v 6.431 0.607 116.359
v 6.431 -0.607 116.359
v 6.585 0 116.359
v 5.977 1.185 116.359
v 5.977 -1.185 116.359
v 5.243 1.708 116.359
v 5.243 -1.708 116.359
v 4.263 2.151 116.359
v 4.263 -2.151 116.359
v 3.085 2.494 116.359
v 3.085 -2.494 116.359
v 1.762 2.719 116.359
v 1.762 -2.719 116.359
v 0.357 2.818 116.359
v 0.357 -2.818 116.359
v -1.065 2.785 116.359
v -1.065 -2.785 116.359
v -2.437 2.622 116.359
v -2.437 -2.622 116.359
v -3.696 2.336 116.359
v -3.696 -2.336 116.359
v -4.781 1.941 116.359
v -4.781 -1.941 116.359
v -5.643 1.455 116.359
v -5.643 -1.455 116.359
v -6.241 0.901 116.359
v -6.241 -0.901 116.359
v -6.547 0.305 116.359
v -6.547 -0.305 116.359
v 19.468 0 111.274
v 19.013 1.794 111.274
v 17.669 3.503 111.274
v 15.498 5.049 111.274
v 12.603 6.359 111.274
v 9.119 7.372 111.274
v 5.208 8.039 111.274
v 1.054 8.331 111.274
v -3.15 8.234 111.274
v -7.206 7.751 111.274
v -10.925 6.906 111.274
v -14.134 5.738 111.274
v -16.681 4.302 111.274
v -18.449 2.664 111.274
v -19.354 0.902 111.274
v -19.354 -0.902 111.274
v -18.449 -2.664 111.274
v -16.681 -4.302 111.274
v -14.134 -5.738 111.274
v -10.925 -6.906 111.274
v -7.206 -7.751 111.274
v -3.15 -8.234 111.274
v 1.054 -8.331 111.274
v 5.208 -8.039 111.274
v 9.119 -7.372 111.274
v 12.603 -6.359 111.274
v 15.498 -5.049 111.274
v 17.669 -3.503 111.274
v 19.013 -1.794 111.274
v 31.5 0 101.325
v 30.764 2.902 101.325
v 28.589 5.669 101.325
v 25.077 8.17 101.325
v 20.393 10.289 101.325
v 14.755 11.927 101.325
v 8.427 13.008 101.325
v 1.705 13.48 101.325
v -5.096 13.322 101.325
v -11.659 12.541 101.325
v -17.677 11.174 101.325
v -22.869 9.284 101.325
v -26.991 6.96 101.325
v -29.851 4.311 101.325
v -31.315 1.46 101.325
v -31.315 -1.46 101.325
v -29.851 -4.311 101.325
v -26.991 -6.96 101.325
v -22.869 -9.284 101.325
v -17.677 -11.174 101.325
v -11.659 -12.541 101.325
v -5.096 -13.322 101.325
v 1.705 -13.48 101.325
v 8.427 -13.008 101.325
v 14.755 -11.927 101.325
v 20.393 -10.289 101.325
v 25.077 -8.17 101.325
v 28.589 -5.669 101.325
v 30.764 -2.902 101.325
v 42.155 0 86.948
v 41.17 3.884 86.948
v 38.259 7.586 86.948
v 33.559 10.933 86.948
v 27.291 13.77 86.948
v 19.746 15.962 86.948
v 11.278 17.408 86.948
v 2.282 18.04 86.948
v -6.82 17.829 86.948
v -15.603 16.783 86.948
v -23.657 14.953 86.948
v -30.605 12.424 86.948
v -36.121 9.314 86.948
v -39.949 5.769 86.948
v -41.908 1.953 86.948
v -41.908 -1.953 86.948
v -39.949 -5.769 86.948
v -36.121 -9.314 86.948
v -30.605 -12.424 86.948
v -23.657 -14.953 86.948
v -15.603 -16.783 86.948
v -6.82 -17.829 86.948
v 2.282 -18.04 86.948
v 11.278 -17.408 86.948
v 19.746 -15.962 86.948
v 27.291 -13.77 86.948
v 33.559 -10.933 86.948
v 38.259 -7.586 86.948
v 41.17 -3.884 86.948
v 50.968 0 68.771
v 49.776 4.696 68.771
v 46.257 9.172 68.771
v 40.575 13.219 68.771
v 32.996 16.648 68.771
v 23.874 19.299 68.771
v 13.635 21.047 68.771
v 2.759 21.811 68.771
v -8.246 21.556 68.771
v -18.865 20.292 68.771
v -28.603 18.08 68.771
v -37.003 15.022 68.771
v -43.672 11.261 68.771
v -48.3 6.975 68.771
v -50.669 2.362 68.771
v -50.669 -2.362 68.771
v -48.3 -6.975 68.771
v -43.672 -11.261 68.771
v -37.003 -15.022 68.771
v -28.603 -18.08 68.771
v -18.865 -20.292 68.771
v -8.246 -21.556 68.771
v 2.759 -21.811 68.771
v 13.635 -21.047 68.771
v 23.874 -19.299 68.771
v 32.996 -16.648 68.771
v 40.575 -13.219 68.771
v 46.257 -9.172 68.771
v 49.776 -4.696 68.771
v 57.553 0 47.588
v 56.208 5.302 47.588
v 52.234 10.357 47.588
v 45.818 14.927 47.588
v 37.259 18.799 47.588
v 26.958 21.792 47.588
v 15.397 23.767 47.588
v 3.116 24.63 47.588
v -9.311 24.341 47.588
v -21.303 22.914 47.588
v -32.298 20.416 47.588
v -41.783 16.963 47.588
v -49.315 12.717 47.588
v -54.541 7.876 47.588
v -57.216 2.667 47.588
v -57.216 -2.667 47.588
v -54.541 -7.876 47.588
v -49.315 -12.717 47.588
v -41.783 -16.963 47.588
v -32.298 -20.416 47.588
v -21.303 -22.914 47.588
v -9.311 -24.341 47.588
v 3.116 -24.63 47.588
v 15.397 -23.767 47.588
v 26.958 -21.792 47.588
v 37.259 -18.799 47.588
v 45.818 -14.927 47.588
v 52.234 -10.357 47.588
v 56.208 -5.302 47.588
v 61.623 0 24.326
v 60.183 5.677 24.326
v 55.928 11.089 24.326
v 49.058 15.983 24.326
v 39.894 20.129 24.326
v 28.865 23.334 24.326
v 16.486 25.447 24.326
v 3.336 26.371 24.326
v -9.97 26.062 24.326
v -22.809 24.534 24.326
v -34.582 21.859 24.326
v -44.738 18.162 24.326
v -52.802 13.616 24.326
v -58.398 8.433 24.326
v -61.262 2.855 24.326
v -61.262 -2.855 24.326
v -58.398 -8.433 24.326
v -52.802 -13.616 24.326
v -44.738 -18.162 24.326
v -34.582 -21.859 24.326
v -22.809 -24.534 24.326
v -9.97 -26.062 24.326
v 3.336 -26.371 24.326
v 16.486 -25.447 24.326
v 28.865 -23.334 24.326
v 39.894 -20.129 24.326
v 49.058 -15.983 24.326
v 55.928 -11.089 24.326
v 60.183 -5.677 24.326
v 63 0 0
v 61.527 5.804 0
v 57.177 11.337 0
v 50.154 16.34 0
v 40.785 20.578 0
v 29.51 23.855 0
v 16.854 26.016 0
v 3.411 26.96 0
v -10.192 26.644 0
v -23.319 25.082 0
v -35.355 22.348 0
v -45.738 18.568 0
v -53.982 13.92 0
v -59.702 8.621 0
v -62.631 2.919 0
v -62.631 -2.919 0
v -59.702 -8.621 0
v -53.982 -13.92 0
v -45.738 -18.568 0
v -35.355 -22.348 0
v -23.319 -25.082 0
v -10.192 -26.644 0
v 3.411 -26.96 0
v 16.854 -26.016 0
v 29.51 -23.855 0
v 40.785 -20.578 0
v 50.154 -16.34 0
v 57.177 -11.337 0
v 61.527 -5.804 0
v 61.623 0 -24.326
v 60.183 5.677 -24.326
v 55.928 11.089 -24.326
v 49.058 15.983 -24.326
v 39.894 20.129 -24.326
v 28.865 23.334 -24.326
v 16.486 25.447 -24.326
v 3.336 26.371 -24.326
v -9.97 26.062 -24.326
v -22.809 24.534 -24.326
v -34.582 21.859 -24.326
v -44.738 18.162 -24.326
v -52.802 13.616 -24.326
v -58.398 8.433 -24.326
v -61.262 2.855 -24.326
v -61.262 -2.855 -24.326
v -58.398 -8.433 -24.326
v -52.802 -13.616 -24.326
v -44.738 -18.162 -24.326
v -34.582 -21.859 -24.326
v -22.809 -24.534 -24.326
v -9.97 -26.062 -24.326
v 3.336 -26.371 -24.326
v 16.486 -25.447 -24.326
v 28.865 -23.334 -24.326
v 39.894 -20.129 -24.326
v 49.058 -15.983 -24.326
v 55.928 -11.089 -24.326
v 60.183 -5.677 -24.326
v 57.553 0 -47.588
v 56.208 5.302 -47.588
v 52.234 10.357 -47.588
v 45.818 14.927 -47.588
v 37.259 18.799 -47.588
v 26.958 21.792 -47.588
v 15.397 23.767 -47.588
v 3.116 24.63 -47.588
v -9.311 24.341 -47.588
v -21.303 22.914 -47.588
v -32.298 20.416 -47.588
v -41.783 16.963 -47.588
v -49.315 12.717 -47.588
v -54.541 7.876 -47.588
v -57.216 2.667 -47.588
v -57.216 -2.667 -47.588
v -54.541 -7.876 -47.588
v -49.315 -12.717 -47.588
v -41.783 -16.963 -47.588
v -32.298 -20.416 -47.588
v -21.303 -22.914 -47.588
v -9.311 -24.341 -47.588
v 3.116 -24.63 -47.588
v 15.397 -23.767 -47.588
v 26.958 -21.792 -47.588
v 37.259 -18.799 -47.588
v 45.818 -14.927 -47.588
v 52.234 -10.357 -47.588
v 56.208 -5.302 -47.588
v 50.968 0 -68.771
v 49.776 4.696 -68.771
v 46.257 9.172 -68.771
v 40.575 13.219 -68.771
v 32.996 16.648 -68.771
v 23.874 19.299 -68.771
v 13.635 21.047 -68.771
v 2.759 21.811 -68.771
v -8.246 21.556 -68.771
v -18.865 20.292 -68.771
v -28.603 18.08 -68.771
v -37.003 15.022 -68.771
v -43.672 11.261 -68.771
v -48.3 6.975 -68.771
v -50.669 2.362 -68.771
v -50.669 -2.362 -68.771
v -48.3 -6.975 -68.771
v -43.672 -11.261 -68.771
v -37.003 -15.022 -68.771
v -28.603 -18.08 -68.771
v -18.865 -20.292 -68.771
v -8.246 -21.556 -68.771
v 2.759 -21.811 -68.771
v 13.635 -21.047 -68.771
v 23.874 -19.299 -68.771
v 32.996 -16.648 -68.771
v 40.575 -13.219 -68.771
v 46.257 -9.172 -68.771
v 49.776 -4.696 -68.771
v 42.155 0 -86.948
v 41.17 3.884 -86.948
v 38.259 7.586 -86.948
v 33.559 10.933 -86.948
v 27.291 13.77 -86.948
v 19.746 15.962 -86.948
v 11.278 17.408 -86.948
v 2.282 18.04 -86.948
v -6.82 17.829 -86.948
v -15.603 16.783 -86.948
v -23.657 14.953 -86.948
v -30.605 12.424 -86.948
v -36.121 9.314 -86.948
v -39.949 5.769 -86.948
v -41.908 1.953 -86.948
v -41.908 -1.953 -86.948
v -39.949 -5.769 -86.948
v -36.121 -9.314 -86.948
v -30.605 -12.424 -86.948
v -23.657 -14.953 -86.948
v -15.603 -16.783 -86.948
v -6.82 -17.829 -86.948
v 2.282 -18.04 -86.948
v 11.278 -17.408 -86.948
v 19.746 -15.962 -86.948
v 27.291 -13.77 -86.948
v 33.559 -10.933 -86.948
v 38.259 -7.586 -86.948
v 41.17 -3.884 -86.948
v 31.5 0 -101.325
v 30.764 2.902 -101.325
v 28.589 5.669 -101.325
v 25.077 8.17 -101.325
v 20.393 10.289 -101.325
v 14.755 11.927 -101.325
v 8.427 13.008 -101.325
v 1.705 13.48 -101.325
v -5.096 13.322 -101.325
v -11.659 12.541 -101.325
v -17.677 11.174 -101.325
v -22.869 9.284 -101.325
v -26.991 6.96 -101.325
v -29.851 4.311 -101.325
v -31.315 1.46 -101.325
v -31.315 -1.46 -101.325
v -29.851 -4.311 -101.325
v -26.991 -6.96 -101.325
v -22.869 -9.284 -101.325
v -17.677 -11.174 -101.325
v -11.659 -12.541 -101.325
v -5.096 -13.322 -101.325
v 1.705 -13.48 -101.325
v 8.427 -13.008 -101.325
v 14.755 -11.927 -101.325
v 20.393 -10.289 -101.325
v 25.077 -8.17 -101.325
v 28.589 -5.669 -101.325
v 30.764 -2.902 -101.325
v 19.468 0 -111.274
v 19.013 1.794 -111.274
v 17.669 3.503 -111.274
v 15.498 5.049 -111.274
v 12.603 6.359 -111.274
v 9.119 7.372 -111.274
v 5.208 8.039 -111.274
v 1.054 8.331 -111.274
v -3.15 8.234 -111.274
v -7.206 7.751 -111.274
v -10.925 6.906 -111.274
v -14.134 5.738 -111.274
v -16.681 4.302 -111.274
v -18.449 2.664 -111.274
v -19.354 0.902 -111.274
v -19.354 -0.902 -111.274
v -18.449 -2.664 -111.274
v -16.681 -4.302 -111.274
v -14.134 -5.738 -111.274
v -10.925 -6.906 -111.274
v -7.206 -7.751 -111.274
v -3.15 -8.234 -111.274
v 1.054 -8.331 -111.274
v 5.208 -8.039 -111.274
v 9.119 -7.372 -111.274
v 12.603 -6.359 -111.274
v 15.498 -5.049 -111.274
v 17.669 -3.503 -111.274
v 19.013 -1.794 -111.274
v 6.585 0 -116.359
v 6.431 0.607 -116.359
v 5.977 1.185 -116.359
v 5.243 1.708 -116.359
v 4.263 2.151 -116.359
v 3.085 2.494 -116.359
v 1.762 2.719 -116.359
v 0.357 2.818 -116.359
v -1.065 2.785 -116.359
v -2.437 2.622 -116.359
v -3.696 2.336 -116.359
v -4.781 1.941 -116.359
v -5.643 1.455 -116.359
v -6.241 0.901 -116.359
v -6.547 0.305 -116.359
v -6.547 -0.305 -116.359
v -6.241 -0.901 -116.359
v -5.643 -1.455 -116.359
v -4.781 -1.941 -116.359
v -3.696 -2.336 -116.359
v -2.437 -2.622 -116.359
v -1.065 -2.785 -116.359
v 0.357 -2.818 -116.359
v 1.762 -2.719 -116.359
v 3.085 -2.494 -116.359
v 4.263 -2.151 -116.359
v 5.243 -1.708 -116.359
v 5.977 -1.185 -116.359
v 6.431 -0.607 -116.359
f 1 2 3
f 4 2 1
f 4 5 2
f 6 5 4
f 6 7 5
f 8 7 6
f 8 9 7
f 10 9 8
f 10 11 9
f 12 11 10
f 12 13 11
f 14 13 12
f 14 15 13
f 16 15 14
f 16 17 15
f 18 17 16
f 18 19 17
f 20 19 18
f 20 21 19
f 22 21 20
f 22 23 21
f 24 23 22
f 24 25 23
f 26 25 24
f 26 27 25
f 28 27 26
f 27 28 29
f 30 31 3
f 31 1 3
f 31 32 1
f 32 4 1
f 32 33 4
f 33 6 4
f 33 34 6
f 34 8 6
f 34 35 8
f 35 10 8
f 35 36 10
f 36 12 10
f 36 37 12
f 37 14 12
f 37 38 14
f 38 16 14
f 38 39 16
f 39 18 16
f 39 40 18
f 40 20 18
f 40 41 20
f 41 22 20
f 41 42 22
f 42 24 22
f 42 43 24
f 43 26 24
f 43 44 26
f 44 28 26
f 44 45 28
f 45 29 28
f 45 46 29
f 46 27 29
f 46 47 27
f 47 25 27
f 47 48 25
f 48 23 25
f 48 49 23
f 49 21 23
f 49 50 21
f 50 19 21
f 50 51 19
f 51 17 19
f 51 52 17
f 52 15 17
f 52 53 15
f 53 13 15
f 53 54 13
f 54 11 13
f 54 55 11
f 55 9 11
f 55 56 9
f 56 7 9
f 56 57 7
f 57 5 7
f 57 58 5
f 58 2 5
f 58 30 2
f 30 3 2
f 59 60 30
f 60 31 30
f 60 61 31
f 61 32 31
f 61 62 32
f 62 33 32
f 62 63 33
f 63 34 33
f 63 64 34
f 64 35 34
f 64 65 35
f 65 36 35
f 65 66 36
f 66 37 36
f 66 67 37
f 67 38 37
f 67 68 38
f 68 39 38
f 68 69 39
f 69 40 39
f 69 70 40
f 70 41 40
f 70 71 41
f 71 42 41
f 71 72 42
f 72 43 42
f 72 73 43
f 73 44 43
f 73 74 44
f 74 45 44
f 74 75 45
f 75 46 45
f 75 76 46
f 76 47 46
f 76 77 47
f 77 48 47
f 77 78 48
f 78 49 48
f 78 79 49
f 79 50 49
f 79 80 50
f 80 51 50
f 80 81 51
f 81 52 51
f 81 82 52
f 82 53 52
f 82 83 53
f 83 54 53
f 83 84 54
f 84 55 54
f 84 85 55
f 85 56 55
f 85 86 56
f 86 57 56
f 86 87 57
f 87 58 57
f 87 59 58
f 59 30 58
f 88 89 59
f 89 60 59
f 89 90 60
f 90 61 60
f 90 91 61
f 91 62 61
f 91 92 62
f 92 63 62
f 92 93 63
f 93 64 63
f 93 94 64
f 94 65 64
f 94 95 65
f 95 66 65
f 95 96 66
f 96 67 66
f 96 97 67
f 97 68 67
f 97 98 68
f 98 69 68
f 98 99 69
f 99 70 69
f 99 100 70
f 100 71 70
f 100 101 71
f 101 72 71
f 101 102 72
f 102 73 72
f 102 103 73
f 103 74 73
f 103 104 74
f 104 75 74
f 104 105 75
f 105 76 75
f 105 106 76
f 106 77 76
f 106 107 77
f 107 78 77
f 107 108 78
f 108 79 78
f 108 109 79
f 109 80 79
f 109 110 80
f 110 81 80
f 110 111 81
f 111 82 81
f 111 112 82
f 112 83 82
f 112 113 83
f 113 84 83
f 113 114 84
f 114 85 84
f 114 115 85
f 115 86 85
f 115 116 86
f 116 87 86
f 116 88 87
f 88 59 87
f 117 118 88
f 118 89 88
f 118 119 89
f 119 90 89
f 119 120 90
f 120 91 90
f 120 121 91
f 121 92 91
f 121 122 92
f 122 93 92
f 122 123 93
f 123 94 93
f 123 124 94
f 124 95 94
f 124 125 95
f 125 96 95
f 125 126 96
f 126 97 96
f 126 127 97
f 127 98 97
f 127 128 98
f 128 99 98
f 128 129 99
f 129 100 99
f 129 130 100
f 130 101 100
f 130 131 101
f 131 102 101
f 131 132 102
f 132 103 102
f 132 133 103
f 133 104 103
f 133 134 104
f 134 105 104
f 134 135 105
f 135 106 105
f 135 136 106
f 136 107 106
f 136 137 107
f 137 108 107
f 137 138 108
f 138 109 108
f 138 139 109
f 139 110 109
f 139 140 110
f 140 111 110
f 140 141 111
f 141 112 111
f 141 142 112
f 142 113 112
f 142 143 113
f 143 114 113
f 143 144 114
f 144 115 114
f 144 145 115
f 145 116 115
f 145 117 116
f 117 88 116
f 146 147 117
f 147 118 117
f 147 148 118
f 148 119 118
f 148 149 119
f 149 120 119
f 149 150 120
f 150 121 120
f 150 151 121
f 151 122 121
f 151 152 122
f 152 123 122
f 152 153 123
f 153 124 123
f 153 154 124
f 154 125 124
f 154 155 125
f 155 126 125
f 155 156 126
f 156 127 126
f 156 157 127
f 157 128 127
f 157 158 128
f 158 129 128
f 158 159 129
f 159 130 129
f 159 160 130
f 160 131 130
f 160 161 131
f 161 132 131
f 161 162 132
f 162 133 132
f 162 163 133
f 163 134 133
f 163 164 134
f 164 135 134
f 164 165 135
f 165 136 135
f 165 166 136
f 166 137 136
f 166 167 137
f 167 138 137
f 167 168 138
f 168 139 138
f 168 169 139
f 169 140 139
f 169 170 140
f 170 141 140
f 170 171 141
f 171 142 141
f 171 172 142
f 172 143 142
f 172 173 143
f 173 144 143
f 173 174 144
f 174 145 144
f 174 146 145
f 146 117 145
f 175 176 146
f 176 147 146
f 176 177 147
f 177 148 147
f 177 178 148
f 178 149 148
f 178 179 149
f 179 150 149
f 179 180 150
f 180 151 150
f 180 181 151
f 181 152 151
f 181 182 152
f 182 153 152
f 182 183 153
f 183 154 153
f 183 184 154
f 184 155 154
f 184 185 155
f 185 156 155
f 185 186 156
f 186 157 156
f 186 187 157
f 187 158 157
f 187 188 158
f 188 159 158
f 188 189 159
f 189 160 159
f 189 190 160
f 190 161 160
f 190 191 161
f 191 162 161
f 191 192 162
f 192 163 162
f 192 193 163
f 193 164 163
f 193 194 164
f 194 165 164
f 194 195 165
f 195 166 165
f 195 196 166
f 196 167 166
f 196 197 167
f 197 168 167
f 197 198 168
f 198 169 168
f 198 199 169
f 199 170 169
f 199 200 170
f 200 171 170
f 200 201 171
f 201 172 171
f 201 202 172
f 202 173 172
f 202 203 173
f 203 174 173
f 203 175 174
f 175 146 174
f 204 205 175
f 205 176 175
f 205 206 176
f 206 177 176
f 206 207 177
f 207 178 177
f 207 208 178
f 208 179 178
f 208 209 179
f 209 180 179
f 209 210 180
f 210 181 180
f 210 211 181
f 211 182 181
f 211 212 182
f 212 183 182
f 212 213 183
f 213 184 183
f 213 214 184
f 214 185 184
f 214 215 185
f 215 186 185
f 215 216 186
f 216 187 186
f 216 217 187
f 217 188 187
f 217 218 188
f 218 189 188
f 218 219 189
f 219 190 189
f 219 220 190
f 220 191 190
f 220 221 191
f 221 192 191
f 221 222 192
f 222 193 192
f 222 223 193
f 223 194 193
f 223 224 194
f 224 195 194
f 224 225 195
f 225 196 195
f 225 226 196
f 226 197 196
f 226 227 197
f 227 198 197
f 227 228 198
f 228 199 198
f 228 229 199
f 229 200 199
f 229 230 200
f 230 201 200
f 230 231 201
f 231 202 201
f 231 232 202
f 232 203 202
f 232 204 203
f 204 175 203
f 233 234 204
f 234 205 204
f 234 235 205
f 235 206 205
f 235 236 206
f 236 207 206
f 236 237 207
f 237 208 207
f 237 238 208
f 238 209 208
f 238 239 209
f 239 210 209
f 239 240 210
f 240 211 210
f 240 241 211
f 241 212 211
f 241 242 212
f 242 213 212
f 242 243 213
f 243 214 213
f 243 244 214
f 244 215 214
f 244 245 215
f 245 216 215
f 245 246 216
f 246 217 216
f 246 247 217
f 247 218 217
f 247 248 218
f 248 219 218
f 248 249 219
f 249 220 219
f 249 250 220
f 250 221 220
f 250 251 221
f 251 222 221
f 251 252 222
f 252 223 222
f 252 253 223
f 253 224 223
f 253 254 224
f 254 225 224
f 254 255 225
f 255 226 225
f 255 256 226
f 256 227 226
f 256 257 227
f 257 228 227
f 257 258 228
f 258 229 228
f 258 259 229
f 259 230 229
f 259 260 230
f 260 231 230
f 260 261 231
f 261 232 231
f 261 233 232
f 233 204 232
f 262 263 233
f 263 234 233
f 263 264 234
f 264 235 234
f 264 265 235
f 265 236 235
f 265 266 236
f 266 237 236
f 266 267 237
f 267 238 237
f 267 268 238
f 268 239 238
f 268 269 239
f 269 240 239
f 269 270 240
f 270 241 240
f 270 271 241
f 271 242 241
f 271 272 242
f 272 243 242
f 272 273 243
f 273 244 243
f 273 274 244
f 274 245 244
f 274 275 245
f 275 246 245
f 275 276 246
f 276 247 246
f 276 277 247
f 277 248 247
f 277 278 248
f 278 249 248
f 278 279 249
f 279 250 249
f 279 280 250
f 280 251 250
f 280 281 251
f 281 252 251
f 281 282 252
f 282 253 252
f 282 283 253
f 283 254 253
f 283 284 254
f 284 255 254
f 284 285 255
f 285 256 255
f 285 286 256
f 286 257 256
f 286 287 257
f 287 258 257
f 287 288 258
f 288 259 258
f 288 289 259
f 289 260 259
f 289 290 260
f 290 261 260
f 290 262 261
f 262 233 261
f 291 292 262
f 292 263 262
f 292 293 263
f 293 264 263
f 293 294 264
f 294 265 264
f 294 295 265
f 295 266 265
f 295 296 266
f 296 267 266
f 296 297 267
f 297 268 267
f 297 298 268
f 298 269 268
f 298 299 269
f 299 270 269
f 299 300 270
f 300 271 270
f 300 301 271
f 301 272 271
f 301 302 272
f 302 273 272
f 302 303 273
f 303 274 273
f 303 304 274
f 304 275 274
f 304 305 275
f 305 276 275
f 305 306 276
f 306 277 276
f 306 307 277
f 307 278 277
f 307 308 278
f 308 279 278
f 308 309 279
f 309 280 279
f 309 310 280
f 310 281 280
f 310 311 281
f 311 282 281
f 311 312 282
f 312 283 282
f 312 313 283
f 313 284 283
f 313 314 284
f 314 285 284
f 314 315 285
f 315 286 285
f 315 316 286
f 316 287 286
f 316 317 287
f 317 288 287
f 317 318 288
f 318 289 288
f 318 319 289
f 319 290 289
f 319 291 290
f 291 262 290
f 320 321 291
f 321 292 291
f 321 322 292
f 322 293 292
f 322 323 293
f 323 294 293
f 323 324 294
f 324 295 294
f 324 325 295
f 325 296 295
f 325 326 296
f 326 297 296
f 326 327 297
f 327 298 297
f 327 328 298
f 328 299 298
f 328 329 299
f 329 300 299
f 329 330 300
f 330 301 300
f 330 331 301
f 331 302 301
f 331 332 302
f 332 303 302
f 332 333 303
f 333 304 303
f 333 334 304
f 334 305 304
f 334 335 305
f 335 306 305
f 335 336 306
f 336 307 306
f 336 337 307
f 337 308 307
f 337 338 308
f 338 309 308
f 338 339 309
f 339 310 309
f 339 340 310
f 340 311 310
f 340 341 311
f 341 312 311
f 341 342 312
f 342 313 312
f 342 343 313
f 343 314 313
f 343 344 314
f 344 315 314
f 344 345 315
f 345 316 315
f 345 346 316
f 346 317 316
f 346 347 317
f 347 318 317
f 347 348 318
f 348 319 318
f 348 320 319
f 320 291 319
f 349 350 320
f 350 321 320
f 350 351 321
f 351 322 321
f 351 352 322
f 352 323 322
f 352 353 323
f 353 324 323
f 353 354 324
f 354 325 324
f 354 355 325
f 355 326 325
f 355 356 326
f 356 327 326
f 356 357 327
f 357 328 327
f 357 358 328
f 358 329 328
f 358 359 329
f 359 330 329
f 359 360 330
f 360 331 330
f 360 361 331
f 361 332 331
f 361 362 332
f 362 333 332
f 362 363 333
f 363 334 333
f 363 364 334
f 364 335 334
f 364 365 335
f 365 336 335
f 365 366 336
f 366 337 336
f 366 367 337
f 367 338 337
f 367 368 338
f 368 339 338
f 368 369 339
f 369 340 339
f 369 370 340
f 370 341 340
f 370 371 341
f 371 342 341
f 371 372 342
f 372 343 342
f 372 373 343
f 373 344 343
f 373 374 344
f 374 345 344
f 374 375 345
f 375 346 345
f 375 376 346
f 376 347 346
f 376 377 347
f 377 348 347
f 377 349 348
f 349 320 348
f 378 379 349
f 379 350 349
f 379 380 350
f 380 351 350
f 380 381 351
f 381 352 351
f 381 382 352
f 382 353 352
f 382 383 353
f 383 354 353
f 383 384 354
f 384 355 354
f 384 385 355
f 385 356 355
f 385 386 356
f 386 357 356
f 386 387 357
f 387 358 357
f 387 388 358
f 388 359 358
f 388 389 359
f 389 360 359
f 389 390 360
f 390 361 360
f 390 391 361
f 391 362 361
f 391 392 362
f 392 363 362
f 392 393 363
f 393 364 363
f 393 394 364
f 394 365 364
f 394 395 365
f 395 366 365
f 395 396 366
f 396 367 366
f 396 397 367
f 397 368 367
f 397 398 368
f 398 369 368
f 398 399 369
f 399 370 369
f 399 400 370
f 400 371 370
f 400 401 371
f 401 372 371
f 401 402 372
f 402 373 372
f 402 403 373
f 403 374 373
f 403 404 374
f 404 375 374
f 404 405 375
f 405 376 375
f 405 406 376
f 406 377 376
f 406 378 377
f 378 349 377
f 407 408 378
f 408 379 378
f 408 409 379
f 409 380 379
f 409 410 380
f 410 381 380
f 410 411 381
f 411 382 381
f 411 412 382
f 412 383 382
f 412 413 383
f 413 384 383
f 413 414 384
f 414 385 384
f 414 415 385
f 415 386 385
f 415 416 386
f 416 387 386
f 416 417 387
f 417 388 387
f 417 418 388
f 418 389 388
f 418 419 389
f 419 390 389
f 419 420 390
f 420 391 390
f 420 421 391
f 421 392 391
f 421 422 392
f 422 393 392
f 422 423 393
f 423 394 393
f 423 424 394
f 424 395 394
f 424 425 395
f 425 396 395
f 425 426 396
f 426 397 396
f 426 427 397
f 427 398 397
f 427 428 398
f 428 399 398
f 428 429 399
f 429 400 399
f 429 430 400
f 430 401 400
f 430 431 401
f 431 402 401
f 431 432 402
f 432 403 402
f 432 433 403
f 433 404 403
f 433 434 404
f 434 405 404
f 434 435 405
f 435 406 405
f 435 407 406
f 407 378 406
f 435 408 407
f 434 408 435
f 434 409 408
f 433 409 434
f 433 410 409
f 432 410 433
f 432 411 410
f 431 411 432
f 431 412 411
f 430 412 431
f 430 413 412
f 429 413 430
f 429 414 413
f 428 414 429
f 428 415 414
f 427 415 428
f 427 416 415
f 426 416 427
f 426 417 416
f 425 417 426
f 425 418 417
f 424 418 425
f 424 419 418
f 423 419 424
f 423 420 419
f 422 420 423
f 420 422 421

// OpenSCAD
// Generated by SolidPython 1.0.1 on 2020-07-29 00:46:47


scale(v = [7, 3, 13]) {
	sphere(r = 9);
}
/***********************************************
*********      SolidPython code:      **********
************************************************
 
# import packages: SolidPython
from solid import *
from solid.utils import *
from itertools import chain, combinations, permutations


class Resize:

    def __init__(self, scad_file):
        self.scad_file = scad_file
        #self.scad_file = import_scad(scad_file)
        # cone/cylinder param:
        self.r1 = 0
        self.r2 = 0
        self.h = 0
        # rectangular prism param:
        self.w = 0
        self.l = 0
        # ellipse param:
        self.r = 0

    # import OpenScad code (file name corresponds to shape)


    # classify shape + parameters
    def assign(self, param1, param2, param3):
        if self.scad_file == 'cone.scad':
            self.r1 = param1
            self.r2 = param2
            self.h = param3
        elif self.scad_file == 'cylinder.scad':
            self.r1 = param1
            self.r2 = param2
            self.h = param3
        elif self.scad_file == 'rectangularPrism.scad':
            self.h = param1
            self.l = param2
            self.w = param3
        else:
            self.r = param1
            self.h = param2

    # resize parameters
    def iterate(self):
        x = range(3, 20, 2)
        i = 1
        if self.scad_file == 'cone.scad':
            tempList = list(permutations(x, 2))
            for temp in tempList:
                param1 = temp[0]
                param2 = temp[1]
                filepath = 'produced_scad_files/' + 'cone' + str(param1) + '_' + str(param2) + '_' + '.scad'
                scad_render_to_file(cylinder(h=param1, r1=param2, r2=0), filepath)

        elif self.scad_file == 'cylinder.scad':
            tempList = list(permutations(x, 3))
            for temp in tempList:
                param1 = temp[0]
                param2 = temp[1]
                filepath = 'produced_scad_files/' + 'cylinder' + str(param1) + '_' + str(param2) + '_' + '.scad'
                scad_render_to_file(cylinder(h=param1, r1=param2, r2=param2), filepath)

        elif self.scad_file == 'rectangularPrism.scad':
            tempList = list(permutations(x, 3))
            for temp in tempList:
                param1 = temp[0]
                param2 = temp[1]
                param3 = temp[2]
                filepath = 'produced_scad_files/' + 'rectangularPrism' + str(param1) + '_' + str(param2) + '_' + str(
                    param3) + '.scad'
                scad_render_to_file(cube(size=(param1, param2, param3)), filepath)

        elif self.scad_file == 'ellipse.scad':
            tempList = list(permutations(x, 4))
            for temp in tempList:
                param1 = temp[0]
                param2 = temp[1]
                param3 = temp[2]
                param4 = temp[3]
                filepath = 'produced_scad_files/' + 'ellipse' + str(param1) + '_' + str(param2) + '_' + str(param3) + '_' + str(param4) + '.scad'
                scad_render_to_file(scale([param1, param2, param3])(sphere(r=param4)), filepath)

    def render_to_scadfile(self):
        scad_render_to_file(scad, 'example.scad') 
 
************************************************/
